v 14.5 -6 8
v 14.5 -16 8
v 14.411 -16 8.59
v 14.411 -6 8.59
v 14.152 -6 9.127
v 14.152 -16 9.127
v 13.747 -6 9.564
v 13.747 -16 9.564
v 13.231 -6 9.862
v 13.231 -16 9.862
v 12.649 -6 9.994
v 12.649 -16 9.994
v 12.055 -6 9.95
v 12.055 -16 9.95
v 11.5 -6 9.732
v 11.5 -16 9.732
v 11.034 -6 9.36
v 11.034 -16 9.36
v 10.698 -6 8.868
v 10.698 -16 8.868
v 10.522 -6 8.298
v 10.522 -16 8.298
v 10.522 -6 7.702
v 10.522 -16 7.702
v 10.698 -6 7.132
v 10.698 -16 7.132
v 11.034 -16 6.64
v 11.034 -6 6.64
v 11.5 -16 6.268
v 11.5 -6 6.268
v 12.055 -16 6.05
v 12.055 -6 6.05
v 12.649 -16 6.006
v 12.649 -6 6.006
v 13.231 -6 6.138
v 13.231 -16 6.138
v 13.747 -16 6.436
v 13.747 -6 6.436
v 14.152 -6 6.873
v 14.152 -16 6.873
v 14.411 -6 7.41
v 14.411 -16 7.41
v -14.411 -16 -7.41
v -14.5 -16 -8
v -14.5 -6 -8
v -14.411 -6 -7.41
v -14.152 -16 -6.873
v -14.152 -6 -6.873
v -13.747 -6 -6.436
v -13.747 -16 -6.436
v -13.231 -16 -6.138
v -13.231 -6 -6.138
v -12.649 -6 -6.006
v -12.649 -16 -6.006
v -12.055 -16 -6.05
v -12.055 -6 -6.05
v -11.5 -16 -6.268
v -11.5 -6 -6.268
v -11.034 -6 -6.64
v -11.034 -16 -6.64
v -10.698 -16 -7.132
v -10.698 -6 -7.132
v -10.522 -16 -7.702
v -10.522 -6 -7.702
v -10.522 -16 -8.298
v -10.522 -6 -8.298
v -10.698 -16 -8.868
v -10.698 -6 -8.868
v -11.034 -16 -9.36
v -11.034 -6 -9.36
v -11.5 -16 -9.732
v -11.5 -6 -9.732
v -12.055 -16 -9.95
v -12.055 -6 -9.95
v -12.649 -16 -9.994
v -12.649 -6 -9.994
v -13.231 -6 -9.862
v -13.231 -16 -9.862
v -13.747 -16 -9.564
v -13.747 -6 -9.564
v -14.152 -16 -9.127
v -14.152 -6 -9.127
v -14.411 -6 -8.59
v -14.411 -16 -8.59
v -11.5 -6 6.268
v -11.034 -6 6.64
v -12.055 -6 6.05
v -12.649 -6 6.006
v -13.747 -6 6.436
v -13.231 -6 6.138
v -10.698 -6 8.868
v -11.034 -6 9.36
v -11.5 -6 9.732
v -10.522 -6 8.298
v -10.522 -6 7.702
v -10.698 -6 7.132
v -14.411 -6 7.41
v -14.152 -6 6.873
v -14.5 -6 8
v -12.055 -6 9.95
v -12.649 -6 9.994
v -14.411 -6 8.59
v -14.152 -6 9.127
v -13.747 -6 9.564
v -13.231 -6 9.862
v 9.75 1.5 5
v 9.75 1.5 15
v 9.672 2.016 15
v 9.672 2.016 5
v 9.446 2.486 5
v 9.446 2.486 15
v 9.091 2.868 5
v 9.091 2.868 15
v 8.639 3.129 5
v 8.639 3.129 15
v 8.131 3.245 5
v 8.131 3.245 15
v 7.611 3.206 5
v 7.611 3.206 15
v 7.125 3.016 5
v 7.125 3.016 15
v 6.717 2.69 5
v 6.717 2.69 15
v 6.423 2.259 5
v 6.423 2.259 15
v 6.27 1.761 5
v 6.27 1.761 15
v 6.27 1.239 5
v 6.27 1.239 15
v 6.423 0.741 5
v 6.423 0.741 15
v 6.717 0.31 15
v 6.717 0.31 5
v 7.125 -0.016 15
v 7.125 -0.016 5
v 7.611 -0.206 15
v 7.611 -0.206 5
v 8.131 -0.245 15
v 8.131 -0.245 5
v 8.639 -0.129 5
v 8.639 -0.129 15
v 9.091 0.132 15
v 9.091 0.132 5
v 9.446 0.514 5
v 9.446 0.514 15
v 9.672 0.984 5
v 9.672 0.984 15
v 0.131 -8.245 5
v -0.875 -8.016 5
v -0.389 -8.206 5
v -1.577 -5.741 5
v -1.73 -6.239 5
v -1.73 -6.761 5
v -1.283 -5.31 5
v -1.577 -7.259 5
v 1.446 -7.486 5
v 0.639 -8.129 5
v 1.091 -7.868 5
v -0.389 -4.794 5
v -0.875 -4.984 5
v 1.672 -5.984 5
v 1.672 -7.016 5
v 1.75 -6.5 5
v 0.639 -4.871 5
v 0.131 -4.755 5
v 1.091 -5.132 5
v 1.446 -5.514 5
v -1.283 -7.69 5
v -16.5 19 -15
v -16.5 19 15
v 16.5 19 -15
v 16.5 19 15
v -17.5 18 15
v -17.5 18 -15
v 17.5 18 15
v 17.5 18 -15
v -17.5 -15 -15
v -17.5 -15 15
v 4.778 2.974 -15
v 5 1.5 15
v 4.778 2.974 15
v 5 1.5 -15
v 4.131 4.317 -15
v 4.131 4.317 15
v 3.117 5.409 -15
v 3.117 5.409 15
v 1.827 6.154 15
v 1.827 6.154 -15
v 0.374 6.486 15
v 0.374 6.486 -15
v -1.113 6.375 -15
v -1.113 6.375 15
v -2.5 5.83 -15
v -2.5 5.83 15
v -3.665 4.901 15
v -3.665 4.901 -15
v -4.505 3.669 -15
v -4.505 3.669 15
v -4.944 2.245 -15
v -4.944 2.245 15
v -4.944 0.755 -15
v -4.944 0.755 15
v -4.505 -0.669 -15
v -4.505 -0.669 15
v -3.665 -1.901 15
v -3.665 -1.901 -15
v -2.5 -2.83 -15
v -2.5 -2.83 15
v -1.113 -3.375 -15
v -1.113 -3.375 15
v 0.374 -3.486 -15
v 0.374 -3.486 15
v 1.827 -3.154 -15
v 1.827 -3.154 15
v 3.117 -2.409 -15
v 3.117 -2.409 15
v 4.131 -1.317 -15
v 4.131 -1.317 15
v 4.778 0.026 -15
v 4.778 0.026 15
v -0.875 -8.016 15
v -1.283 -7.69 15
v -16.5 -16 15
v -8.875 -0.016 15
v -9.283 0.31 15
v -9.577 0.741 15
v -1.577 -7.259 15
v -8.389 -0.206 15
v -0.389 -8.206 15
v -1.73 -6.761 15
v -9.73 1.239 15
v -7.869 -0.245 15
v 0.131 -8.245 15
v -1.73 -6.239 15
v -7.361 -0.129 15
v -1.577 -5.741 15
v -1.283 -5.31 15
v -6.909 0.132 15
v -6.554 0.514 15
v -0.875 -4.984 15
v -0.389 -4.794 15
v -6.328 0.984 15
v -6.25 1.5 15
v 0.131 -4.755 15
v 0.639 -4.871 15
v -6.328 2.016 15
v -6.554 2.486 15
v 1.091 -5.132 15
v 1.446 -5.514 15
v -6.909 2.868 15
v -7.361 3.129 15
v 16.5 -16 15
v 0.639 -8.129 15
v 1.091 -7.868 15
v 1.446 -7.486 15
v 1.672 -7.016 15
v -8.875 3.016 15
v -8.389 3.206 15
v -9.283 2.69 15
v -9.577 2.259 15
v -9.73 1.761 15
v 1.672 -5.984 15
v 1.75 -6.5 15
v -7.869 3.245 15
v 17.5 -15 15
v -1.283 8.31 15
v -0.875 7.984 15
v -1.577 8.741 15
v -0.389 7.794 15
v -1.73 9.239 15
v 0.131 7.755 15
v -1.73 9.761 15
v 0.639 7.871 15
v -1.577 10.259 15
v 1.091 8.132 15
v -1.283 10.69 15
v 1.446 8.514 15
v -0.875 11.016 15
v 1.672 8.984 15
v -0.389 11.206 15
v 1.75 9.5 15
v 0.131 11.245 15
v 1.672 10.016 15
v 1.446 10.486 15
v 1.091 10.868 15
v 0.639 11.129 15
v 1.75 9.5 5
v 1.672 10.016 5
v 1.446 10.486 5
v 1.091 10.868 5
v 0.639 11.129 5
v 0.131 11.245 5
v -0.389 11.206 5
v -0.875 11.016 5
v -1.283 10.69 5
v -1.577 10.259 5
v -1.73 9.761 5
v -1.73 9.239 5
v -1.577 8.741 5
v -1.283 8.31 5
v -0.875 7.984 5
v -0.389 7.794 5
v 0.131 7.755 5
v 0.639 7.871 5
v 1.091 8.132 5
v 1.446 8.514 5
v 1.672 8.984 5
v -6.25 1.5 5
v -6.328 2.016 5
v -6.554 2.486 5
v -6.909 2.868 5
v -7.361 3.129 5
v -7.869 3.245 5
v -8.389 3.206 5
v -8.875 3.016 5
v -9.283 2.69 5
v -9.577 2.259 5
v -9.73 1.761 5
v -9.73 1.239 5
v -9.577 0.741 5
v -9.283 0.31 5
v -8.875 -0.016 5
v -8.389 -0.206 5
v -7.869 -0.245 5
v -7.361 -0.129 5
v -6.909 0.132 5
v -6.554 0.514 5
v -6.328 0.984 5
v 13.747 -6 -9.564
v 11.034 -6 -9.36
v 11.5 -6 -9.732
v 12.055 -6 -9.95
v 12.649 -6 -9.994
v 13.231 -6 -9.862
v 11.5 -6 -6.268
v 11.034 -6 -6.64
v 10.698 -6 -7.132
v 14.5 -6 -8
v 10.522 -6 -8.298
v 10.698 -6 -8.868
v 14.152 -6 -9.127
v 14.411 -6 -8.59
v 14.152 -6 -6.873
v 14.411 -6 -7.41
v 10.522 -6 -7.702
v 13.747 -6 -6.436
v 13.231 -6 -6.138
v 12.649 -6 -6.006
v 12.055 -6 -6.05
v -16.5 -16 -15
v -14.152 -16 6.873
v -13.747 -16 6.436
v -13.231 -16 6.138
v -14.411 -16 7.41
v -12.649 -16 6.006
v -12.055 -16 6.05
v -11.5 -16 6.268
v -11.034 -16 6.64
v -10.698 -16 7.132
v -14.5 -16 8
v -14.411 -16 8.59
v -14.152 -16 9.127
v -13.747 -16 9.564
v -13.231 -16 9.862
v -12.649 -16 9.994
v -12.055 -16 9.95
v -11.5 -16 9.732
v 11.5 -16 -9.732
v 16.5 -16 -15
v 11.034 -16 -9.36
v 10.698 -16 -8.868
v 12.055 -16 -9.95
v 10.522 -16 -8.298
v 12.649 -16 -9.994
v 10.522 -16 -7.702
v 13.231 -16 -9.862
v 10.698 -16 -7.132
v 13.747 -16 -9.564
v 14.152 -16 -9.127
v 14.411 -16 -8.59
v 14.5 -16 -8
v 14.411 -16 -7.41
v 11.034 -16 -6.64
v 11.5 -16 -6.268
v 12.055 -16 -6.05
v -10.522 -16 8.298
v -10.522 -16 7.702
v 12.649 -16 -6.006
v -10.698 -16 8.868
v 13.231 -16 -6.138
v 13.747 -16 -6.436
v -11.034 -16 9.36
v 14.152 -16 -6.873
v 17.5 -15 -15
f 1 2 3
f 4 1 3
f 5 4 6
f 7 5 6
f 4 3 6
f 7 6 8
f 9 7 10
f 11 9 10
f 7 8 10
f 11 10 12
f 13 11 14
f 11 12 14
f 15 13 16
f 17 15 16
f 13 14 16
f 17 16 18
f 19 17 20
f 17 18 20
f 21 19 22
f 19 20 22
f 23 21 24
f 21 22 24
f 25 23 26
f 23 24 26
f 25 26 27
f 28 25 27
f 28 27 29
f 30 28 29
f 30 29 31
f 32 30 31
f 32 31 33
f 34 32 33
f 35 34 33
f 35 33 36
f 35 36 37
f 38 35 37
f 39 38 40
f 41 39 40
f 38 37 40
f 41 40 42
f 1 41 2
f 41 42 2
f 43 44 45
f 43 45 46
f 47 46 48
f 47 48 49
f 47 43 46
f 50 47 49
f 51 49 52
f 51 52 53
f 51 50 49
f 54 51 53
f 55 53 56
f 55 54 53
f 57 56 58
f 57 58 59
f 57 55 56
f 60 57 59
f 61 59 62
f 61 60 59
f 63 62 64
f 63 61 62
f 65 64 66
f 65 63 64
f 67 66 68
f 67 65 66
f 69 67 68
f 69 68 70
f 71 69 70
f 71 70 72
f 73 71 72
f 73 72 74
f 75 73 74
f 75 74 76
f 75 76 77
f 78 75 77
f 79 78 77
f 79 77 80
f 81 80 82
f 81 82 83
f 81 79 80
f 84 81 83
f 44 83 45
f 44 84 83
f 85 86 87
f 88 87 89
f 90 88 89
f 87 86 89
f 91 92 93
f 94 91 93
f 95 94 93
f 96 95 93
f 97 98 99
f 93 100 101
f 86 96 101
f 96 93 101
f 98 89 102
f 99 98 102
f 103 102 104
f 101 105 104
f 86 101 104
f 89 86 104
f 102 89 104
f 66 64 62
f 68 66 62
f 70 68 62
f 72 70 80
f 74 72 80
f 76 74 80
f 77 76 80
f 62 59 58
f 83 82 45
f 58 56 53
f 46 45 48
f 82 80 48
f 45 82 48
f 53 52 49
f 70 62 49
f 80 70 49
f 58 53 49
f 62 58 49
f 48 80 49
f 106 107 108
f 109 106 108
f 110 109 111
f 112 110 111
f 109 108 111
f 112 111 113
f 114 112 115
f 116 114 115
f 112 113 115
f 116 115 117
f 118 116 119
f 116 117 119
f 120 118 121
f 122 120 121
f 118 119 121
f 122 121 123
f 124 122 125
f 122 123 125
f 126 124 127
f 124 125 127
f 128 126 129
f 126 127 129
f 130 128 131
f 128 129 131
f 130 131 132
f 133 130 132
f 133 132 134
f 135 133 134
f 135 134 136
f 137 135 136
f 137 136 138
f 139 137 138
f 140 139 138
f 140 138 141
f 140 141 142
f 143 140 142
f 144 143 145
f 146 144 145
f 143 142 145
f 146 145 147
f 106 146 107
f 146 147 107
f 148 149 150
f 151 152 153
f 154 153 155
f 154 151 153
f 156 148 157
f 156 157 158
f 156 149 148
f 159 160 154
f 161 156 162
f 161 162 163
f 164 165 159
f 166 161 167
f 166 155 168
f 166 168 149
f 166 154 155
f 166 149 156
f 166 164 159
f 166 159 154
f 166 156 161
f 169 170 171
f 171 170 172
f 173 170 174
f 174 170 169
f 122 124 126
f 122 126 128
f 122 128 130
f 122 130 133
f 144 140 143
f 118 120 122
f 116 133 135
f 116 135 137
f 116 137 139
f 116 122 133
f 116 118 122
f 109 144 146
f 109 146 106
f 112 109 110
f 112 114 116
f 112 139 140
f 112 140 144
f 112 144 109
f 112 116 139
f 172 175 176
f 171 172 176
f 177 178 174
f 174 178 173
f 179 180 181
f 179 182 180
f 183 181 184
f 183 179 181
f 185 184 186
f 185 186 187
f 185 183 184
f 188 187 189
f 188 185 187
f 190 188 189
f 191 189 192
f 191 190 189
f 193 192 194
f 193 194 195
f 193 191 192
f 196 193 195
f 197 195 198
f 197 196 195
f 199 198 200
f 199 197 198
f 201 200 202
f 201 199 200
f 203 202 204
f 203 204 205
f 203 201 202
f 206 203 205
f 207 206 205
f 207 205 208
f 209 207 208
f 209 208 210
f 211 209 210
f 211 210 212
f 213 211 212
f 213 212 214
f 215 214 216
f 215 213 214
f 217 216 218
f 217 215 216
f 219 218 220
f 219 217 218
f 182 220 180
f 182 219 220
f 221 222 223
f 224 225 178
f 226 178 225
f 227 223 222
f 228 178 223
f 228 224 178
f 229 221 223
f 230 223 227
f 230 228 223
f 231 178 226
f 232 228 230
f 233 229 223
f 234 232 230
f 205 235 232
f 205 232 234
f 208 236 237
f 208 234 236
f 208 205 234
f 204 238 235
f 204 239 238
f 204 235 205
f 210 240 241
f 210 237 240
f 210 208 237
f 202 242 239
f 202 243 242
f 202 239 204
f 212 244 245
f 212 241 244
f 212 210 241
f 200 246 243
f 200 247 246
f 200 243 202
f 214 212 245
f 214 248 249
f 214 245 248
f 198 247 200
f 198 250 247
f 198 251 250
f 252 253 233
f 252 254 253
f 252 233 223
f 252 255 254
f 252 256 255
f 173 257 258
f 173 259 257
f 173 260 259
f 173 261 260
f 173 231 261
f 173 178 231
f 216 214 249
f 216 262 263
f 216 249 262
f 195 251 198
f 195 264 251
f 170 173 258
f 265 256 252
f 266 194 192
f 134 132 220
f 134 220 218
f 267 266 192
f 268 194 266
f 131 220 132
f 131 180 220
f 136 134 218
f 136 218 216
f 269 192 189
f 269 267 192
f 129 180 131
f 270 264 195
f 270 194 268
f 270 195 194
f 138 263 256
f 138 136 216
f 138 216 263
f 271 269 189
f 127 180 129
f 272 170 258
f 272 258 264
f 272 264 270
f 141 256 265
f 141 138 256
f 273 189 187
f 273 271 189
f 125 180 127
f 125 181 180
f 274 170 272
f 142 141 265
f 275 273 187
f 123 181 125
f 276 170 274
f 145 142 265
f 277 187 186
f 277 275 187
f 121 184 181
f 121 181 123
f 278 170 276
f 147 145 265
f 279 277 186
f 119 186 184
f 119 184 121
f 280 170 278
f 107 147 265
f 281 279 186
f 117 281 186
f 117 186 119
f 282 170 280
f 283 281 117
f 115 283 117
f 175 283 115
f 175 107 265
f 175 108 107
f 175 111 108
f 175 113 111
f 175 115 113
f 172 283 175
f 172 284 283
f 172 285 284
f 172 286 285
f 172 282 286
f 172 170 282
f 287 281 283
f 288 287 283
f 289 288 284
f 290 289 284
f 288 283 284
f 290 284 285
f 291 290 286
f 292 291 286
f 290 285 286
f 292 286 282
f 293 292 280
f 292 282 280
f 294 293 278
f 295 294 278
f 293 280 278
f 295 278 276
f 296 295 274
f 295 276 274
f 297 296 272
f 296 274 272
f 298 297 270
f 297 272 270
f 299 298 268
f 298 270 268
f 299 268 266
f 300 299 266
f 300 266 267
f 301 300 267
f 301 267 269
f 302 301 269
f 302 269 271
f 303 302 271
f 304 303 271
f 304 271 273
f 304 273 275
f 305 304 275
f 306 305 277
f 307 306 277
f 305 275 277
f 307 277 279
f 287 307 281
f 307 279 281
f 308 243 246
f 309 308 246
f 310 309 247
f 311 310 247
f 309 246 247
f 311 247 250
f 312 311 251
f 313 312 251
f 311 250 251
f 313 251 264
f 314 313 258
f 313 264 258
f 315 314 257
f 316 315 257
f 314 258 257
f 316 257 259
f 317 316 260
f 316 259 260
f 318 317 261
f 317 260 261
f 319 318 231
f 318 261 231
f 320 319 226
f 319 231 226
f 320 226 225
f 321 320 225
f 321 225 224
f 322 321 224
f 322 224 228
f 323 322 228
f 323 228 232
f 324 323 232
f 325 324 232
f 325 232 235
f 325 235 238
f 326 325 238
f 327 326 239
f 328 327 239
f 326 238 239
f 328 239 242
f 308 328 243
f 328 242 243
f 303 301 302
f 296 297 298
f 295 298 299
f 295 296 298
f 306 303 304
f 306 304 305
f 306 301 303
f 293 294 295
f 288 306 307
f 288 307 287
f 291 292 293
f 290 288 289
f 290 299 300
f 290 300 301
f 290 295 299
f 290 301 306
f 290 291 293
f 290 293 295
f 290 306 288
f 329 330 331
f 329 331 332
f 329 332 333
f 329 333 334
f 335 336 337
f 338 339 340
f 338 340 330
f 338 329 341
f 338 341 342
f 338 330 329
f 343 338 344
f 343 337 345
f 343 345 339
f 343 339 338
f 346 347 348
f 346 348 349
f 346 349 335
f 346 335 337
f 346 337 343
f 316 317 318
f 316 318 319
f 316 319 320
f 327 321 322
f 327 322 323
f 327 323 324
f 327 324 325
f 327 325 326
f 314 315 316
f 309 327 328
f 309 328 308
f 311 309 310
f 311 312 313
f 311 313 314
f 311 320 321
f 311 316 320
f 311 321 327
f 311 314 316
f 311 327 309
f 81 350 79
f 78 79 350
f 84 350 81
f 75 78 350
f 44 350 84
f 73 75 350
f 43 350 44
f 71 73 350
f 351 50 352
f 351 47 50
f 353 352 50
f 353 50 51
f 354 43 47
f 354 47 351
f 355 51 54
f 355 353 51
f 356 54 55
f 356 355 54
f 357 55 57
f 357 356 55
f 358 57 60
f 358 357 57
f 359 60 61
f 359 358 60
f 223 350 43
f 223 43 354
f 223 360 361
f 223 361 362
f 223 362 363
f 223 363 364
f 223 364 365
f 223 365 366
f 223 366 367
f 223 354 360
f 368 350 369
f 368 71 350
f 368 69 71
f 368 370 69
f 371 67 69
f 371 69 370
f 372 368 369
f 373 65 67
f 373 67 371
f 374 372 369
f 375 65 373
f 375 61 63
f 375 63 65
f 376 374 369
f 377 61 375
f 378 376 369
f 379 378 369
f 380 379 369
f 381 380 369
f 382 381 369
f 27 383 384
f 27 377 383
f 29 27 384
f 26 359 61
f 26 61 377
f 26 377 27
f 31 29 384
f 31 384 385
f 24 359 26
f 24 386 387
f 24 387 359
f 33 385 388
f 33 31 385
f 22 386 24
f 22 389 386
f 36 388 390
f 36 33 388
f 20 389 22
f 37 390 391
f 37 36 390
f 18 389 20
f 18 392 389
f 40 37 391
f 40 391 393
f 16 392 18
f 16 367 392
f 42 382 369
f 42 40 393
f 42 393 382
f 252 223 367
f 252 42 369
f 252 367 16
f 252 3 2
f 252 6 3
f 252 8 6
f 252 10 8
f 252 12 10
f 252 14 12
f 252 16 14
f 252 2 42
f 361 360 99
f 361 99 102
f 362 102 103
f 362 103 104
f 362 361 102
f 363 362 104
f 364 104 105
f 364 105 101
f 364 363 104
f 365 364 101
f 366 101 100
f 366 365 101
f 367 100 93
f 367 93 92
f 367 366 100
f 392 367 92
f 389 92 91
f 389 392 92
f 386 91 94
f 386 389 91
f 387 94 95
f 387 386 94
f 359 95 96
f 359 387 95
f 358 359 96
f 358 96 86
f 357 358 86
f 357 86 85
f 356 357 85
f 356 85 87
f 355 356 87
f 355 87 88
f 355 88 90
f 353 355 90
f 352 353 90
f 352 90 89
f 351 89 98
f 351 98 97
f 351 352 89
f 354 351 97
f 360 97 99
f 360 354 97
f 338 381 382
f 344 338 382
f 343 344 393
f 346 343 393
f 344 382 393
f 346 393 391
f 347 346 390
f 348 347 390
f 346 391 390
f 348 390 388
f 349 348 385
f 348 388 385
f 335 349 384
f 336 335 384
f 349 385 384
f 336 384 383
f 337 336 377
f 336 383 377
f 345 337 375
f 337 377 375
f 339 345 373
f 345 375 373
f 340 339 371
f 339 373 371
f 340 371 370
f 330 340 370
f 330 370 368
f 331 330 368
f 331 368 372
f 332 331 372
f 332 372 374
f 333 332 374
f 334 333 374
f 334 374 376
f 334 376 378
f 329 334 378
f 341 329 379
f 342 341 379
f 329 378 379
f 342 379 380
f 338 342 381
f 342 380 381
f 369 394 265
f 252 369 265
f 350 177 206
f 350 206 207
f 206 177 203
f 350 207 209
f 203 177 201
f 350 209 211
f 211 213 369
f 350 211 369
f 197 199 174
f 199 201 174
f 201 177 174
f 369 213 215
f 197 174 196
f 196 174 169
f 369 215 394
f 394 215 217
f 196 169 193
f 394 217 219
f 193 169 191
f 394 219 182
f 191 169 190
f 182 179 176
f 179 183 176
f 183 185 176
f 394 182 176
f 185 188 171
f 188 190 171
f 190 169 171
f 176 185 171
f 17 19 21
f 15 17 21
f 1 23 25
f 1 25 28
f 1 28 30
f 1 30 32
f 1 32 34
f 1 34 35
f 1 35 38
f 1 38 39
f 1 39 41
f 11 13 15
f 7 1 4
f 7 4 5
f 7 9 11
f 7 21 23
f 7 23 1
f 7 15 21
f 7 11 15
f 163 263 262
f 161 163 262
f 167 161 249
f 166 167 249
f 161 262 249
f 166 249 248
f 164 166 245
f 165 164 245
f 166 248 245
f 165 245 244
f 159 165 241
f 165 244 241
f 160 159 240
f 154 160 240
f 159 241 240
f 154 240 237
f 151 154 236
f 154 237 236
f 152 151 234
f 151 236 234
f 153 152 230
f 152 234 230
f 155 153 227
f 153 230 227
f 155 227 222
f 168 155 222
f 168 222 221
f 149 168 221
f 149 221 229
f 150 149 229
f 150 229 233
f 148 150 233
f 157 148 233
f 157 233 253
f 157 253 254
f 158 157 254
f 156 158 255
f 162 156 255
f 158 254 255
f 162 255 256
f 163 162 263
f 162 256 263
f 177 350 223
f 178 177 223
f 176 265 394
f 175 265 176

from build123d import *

# Parameters (mm, degrees)
SKETCH1_W           = 35
SKETCH1_H           = 35
SKETCH1_R           = 5
BOSS_EXTRUDE1_DEPTH = 15
SKETCH2_R           = 1.75
CUT_EXTRUDE1_DEPTH  = 10
CHAMFER1_SIZE       = 1
SKETCH3_R           = 2
CUT_EXTRUDE2_DEPTH  = 10


with BuildPart() as part:
    # Sketch1 → Boss-Extrude1 (new body, symmetric)
    with BuildSketch(Plane.XY):
        with Locations((0, 1.5)):
            Rectangle(SKETCH1_W, SKETCH1_H)
        with Locations((0, 1.5)):
            Circle(SKETCH1_R, mode=Mode.SUBTRACT)
    extrude(amount=BOSS_EXTRUDE1_DEPTH, both=True)

    # Sketch2 → Cut-Extrude1 (cut)
    with BuildSketch(Plane.XY.offset(15)):
        with Locations((0, 9.5)):
            Circle(SKETCH2_R)
        with Locations((0, -6.5)):
            Circle(SKETCH2_R)
        with Locations((8, 1.5)):
            Circle(SKETCH2_R)
        with Locations((-8, 1.5)):
            Circle(SKETCH2_R)
    extrude(amount=-CUT_EXTRUDE1_DEPTH, mode=Mode.SUBTRACT)

    # Chamfer1
    chamfer1_edges = [part.edges().sort_by_distance(p)[0] for p in [
        (-17.5, 19, 0),
        (17.5, 19, 0),
        (17.5, -16, 0),
        (-17.5, -16, 0),
    ]]
    chamfer(chamfer1_edges, length=CHAMFER1_SIZE)

    # Sketch3 → Cut-Extrude2 (cut)
    with BuildSketch(Plane.XZ.offset(16)):
        with Locations((12.5, 8)):
            Circle(SKETCH3_R)
        with Locations((12.5, -8)):
            Circle(SKETCH3_R)
    cut_extrude2 = extrude(amount=-CUT_EXTRUDE2_DEPTH, mode=Mode.SUBTRACT)

    # Mirror1: Cut-Extrude2 across plane
    add(cut_extrude2.mirror(Plane(origin=(0, 0, 0), x_dir=(0, 0, 1), z_dir=(1, 0, 0))), mode=Mode.SUBTRACT)


solid = part.part
